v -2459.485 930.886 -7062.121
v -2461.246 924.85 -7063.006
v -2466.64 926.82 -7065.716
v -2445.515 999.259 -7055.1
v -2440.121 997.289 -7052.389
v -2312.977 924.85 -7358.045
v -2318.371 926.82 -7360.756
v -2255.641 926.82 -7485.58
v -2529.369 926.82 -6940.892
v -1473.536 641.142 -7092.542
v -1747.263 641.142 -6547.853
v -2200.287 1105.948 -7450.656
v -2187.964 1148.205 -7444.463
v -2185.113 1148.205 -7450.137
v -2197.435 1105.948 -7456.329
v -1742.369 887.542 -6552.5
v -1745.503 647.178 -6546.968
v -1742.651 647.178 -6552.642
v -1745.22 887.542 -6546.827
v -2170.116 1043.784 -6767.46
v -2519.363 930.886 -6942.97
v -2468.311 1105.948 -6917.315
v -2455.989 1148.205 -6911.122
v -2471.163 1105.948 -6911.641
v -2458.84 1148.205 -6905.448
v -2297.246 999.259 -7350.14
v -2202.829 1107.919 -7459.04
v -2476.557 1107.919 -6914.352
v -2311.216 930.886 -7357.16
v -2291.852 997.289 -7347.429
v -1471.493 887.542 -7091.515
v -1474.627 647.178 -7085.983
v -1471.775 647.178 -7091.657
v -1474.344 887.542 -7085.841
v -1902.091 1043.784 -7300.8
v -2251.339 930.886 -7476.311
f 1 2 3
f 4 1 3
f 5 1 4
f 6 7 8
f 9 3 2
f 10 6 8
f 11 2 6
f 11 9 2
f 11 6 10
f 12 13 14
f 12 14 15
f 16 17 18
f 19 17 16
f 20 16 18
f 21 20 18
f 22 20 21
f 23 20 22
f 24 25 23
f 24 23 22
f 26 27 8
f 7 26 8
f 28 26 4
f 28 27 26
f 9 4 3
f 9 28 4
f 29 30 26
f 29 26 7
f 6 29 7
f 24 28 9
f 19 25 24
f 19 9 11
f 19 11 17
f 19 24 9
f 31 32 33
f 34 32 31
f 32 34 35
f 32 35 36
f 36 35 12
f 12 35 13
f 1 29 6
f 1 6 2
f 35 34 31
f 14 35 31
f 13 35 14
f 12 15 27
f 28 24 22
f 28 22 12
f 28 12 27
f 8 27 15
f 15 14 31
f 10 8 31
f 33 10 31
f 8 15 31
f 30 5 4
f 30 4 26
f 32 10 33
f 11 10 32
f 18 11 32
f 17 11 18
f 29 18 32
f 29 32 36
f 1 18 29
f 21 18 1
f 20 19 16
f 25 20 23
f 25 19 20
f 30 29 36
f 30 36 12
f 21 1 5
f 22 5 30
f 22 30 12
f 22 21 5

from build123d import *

# Parameters (mm, degrees)
BOSS_EXTRUDE1_DEPTH = 609.6
CUT_EXTRUDE1_DEPTH  = 596.9
CUT_EXTRUDE2_START  = -6.35
CUT_EXTRUDE2_DEPTH  = 6.35


with BuildPart() as part:
    # Sketch1 → Boss-Extrude1 (new body)
    with BuildSketch(Plane(origin=(2274.798526179, 0, -4526.609622936), x_dir=(0.8935178411679832, 0, 0.44902769125579206), z_dir=(-0.44902769125579206, 0, 0.8935178411679832))):
        Polygon((-4499.407931927, 647.178189885), (-4499.091966051, 887.542246672), (-5297.754801193, 1148.204732428), (-5311.546165746, 1105.948362922), (-5317.582789961, 1107.918557858), (-5376.688638045, 926.819831407), (-4501.378126863, 641.14156567), align=None)
    extrude(amount=-BOSS_EXTRUDE1_DEPTH)

    # Sketch2 → Cut-Extrude1 (cut)
    with BuildSketch(Plane(origin=(2277.649852018, 0, -4532.283461227), x_dir=(-0.8935178411679832, 0, -0.44902769125579206), z_dir=(0.44902769125579206, 0, -0.8935178411679832))):
        Polygon((5297.754801193, 1148.204732428), (4977.813717796, 1043.784400813), (4499.091966051, 887.542246672), (4499.407931927, 647.178189885), (5368.681818894, 930.886260686), align=None)
    extrude(amount=CUT_EXTRUDE1_DEPTH, mode=Mode.SUBTRACT)

    # Sketch3 → Cut-Extrude2 (cut)
    with BuildSketch(Plane(origin=(-4585.952542808, 1675.102491314, -2304.620666347), x_dir=(-0.40095713367550895, 0.14645687831706847, 0.9043139718860588), z_dir=(-0.8494222734757242, 0.31026691907399934, -0.4268679424033393)).offset(CUT_EXTRUDE2_START)):
        Polygon((-5579.388539548, 150.427587067), (-5591.127897041, 75.137298944), (-5264.869981841, 24.266749807), (-5253.130624348, 99.55703793), align=None)
    extrude(amount=CUT_EXTRUDE2_DEPTH, mode=Mode.SUBTRACT)


solid = part.part
